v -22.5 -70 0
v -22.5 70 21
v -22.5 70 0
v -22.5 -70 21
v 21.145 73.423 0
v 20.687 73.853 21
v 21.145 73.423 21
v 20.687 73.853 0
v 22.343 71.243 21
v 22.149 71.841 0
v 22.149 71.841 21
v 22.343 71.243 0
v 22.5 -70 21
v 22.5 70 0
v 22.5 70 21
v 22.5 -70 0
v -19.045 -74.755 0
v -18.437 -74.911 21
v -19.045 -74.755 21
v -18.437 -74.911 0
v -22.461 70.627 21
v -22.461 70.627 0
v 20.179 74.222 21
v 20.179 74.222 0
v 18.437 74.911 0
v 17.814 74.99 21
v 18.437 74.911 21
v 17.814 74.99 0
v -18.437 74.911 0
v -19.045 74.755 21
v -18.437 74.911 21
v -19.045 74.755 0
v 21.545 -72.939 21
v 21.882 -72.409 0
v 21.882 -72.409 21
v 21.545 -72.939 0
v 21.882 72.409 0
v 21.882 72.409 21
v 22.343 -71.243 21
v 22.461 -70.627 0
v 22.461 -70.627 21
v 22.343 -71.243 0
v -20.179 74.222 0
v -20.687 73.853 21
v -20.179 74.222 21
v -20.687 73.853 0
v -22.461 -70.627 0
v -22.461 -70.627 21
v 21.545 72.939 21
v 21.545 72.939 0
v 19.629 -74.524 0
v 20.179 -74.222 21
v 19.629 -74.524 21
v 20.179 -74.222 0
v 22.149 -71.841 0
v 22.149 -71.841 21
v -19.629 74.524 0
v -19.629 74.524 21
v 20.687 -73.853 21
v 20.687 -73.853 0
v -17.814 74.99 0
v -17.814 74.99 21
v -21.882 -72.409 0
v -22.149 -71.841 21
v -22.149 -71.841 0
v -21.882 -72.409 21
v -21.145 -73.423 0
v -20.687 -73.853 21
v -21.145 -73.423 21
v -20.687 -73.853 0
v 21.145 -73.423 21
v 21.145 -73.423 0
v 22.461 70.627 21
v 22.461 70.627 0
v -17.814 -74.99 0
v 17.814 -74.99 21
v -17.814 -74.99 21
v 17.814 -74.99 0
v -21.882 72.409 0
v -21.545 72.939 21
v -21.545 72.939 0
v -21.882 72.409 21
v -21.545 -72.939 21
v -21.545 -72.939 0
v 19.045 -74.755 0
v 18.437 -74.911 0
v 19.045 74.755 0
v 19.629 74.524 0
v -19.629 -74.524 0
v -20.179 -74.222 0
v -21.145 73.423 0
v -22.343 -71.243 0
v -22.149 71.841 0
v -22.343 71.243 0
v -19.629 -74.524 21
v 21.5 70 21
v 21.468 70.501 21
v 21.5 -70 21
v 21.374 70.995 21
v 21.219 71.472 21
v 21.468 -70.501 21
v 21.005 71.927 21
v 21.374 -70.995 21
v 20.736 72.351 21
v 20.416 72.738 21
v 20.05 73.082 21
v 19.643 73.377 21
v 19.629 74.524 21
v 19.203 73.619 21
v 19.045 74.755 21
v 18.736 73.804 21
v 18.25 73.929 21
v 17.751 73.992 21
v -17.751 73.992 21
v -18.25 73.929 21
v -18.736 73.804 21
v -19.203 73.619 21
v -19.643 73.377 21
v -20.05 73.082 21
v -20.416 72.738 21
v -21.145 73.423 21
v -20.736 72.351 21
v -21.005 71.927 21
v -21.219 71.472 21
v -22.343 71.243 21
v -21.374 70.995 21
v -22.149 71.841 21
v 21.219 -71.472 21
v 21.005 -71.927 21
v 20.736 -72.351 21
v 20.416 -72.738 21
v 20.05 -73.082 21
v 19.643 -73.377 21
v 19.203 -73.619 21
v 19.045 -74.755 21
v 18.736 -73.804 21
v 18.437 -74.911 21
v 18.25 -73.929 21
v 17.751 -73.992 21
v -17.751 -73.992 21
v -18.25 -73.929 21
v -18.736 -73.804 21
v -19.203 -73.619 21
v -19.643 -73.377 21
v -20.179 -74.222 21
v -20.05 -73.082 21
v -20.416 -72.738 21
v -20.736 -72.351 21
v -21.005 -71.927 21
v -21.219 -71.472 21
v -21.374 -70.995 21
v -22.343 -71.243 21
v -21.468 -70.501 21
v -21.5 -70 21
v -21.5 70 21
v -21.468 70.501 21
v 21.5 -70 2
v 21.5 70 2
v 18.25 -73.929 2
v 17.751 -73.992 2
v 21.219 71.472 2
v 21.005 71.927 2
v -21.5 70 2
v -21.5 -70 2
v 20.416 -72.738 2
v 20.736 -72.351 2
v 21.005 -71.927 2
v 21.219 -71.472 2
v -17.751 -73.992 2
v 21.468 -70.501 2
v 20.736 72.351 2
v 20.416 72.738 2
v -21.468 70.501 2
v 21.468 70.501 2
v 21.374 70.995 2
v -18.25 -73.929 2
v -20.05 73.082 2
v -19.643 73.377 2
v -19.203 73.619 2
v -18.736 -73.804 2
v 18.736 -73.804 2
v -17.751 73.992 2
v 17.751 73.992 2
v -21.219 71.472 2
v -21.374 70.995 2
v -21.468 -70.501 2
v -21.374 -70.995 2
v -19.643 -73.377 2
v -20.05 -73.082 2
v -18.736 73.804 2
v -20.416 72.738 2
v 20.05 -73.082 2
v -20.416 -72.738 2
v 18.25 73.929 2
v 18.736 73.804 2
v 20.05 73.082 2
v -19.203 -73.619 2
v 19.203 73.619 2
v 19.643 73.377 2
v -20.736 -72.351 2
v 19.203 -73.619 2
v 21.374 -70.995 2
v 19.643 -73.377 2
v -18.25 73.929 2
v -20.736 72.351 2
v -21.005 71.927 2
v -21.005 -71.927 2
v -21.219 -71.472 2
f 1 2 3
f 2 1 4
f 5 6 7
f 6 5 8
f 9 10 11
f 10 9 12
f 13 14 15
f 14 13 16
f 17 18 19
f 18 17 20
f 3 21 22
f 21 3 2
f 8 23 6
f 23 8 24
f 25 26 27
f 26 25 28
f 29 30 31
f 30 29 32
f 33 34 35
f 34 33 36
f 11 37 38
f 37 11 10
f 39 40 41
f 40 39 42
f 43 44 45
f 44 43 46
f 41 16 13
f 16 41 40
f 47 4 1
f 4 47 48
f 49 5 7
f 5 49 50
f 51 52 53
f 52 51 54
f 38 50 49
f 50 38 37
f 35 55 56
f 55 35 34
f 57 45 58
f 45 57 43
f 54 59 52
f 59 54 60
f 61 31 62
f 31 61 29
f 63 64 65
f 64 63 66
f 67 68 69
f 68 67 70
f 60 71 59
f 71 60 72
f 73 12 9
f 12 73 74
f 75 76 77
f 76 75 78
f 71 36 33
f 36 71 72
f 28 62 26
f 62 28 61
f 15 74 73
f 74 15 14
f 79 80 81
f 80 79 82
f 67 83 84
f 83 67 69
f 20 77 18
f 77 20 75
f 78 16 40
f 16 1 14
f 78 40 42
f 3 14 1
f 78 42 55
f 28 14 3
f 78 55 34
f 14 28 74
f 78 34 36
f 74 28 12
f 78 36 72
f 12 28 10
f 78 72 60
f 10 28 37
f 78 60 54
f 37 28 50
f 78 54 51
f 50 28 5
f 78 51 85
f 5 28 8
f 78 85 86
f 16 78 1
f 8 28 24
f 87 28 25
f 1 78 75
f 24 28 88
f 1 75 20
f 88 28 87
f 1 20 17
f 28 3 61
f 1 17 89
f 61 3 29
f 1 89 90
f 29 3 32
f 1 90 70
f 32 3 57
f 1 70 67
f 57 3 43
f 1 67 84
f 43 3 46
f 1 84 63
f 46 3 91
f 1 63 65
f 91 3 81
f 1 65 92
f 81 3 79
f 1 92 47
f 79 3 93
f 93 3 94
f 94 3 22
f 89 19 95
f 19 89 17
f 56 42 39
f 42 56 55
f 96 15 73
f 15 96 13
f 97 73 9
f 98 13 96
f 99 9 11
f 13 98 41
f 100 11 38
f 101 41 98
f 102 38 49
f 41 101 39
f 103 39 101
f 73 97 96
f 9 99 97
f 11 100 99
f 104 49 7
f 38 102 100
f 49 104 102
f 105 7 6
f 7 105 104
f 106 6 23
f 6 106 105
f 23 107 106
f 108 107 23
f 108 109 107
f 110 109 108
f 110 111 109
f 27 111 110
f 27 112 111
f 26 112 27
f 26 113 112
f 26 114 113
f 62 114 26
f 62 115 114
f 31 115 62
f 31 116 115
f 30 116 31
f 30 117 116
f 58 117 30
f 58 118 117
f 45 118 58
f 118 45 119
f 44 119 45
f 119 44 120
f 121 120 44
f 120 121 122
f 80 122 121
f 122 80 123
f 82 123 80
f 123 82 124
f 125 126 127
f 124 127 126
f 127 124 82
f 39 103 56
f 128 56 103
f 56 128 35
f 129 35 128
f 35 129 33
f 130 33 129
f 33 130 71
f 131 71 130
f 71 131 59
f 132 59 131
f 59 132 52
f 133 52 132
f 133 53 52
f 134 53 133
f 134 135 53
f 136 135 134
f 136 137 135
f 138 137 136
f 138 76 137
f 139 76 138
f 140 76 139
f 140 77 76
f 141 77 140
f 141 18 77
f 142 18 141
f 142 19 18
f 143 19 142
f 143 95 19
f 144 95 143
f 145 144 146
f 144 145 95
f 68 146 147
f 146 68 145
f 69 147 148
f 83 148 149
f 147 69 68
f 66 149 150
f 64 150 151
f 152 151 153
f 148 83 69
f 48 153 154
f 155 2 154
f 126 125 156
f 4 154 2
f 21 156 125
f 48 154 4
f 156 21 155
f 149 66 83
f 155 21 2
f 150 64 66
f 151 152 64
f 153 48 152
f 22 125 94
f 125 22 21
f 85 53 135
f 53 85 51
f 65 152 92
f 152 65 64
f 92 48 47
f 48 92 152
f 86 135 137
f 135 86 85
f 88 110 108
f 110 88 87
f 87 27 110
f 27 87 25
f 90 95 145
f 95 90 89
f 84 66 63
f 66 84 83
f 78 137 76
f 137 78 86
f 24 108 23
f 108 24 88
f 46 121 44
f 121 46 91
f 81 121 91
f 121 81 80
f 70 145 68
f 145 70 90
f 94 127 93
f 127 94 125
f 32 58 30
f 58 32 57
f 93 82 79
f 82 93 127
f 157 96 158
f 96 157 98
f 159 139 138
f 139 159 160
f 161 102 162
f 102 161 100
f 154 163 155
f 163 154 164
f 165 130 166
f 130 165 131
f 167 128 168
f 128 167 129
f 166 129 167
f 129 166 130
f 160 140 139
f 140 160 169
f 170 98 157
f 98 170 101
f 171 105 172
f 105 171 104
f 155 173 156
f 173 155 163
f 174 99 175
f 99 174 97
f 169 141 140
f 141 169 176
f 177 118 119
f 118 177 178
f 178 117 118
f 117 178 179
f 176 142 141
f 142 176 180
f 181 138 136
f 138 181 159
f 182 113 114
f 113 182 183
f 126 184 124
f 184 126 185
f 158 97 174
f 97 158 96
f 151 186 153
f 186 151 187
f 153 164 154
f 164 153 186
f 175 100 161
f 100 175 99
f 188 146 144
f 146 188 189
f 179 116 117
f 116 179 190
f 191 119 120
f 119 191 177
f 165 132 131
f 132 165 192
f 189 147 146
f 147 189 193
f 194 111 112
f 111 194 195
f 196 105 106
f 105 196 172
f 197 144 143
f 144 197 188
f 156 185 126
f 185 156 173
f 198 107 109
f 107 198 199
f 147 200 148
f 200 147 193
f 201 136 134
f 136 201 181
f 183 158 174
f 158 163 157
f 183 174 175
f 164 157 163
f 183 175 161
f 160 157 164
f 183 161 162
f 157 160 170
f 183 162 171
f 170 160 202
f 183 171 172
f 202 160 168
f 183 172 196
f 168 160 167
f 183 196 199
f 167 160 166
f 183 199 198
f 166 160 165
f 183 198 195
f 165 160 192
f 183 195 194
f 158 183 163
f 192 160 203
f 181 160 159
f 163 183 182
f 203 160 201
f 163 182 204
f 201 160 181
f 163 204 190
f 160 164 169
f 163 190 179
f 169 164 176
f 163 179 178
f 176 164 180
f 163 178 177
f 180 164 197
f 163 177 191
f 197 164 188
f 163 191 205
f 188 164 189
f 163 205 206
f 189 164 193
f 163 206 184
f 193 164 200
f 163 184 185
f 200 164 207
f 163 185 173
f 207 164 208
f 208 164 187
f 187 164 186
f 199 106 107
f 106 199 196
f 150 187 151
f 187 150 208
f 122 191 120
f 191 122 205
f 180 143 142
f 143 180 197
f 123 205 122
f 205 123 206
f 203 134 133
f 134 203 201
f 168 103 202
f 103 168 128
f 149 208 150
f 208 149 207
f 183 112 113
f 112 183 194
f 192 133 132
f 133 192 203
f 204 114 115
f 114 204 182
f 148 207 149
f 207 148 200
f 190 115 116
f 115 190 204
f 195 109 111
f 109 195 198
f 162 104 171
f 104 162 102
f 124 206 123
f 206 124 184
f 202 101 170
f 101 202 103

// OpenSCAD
$fn = 50;


difference() {
	union() {
		hull() {
			translate(v = [-17.5000000000, 70.0000000000, 0]) {
				cylinder(h = 21, r = 5);
			}
			translate(v = [17.5000000000, 70.0000000000, 0]) {
				cylinder(h = 21, r = 5);
			}
			translate(v = [-17.5000000000, -70.0000000000, 0]) {
				cylinder(h = 21, r = 5);
			}
			translate(v = [17.5000000000, -70.0000000000, 0]) {
				cylinder(h = 21, r = 5);
			}
		}
	}
	union() {
		translate(v = [0, 0, 2]) {
			hull() {
				translate(v = [-17.5000000000, 70.0000000000, 0]) {
					cylinder(h = 19, r = 4);
				}
				translate(v = [17.5000000000, 70.0000000000, 0]) {
					cylinder(h = 19, r = 4);
				}
				translate(v = [-17.5000000000, -70.0000000000, 0]) {
					cylinder(h = 19, r = 4);
				}
				translate(v = [17.5000000000, -70.0000000000, 0]) {
					cylinder(h = 19, r = 4);
				}
			}
		}
	}
}
